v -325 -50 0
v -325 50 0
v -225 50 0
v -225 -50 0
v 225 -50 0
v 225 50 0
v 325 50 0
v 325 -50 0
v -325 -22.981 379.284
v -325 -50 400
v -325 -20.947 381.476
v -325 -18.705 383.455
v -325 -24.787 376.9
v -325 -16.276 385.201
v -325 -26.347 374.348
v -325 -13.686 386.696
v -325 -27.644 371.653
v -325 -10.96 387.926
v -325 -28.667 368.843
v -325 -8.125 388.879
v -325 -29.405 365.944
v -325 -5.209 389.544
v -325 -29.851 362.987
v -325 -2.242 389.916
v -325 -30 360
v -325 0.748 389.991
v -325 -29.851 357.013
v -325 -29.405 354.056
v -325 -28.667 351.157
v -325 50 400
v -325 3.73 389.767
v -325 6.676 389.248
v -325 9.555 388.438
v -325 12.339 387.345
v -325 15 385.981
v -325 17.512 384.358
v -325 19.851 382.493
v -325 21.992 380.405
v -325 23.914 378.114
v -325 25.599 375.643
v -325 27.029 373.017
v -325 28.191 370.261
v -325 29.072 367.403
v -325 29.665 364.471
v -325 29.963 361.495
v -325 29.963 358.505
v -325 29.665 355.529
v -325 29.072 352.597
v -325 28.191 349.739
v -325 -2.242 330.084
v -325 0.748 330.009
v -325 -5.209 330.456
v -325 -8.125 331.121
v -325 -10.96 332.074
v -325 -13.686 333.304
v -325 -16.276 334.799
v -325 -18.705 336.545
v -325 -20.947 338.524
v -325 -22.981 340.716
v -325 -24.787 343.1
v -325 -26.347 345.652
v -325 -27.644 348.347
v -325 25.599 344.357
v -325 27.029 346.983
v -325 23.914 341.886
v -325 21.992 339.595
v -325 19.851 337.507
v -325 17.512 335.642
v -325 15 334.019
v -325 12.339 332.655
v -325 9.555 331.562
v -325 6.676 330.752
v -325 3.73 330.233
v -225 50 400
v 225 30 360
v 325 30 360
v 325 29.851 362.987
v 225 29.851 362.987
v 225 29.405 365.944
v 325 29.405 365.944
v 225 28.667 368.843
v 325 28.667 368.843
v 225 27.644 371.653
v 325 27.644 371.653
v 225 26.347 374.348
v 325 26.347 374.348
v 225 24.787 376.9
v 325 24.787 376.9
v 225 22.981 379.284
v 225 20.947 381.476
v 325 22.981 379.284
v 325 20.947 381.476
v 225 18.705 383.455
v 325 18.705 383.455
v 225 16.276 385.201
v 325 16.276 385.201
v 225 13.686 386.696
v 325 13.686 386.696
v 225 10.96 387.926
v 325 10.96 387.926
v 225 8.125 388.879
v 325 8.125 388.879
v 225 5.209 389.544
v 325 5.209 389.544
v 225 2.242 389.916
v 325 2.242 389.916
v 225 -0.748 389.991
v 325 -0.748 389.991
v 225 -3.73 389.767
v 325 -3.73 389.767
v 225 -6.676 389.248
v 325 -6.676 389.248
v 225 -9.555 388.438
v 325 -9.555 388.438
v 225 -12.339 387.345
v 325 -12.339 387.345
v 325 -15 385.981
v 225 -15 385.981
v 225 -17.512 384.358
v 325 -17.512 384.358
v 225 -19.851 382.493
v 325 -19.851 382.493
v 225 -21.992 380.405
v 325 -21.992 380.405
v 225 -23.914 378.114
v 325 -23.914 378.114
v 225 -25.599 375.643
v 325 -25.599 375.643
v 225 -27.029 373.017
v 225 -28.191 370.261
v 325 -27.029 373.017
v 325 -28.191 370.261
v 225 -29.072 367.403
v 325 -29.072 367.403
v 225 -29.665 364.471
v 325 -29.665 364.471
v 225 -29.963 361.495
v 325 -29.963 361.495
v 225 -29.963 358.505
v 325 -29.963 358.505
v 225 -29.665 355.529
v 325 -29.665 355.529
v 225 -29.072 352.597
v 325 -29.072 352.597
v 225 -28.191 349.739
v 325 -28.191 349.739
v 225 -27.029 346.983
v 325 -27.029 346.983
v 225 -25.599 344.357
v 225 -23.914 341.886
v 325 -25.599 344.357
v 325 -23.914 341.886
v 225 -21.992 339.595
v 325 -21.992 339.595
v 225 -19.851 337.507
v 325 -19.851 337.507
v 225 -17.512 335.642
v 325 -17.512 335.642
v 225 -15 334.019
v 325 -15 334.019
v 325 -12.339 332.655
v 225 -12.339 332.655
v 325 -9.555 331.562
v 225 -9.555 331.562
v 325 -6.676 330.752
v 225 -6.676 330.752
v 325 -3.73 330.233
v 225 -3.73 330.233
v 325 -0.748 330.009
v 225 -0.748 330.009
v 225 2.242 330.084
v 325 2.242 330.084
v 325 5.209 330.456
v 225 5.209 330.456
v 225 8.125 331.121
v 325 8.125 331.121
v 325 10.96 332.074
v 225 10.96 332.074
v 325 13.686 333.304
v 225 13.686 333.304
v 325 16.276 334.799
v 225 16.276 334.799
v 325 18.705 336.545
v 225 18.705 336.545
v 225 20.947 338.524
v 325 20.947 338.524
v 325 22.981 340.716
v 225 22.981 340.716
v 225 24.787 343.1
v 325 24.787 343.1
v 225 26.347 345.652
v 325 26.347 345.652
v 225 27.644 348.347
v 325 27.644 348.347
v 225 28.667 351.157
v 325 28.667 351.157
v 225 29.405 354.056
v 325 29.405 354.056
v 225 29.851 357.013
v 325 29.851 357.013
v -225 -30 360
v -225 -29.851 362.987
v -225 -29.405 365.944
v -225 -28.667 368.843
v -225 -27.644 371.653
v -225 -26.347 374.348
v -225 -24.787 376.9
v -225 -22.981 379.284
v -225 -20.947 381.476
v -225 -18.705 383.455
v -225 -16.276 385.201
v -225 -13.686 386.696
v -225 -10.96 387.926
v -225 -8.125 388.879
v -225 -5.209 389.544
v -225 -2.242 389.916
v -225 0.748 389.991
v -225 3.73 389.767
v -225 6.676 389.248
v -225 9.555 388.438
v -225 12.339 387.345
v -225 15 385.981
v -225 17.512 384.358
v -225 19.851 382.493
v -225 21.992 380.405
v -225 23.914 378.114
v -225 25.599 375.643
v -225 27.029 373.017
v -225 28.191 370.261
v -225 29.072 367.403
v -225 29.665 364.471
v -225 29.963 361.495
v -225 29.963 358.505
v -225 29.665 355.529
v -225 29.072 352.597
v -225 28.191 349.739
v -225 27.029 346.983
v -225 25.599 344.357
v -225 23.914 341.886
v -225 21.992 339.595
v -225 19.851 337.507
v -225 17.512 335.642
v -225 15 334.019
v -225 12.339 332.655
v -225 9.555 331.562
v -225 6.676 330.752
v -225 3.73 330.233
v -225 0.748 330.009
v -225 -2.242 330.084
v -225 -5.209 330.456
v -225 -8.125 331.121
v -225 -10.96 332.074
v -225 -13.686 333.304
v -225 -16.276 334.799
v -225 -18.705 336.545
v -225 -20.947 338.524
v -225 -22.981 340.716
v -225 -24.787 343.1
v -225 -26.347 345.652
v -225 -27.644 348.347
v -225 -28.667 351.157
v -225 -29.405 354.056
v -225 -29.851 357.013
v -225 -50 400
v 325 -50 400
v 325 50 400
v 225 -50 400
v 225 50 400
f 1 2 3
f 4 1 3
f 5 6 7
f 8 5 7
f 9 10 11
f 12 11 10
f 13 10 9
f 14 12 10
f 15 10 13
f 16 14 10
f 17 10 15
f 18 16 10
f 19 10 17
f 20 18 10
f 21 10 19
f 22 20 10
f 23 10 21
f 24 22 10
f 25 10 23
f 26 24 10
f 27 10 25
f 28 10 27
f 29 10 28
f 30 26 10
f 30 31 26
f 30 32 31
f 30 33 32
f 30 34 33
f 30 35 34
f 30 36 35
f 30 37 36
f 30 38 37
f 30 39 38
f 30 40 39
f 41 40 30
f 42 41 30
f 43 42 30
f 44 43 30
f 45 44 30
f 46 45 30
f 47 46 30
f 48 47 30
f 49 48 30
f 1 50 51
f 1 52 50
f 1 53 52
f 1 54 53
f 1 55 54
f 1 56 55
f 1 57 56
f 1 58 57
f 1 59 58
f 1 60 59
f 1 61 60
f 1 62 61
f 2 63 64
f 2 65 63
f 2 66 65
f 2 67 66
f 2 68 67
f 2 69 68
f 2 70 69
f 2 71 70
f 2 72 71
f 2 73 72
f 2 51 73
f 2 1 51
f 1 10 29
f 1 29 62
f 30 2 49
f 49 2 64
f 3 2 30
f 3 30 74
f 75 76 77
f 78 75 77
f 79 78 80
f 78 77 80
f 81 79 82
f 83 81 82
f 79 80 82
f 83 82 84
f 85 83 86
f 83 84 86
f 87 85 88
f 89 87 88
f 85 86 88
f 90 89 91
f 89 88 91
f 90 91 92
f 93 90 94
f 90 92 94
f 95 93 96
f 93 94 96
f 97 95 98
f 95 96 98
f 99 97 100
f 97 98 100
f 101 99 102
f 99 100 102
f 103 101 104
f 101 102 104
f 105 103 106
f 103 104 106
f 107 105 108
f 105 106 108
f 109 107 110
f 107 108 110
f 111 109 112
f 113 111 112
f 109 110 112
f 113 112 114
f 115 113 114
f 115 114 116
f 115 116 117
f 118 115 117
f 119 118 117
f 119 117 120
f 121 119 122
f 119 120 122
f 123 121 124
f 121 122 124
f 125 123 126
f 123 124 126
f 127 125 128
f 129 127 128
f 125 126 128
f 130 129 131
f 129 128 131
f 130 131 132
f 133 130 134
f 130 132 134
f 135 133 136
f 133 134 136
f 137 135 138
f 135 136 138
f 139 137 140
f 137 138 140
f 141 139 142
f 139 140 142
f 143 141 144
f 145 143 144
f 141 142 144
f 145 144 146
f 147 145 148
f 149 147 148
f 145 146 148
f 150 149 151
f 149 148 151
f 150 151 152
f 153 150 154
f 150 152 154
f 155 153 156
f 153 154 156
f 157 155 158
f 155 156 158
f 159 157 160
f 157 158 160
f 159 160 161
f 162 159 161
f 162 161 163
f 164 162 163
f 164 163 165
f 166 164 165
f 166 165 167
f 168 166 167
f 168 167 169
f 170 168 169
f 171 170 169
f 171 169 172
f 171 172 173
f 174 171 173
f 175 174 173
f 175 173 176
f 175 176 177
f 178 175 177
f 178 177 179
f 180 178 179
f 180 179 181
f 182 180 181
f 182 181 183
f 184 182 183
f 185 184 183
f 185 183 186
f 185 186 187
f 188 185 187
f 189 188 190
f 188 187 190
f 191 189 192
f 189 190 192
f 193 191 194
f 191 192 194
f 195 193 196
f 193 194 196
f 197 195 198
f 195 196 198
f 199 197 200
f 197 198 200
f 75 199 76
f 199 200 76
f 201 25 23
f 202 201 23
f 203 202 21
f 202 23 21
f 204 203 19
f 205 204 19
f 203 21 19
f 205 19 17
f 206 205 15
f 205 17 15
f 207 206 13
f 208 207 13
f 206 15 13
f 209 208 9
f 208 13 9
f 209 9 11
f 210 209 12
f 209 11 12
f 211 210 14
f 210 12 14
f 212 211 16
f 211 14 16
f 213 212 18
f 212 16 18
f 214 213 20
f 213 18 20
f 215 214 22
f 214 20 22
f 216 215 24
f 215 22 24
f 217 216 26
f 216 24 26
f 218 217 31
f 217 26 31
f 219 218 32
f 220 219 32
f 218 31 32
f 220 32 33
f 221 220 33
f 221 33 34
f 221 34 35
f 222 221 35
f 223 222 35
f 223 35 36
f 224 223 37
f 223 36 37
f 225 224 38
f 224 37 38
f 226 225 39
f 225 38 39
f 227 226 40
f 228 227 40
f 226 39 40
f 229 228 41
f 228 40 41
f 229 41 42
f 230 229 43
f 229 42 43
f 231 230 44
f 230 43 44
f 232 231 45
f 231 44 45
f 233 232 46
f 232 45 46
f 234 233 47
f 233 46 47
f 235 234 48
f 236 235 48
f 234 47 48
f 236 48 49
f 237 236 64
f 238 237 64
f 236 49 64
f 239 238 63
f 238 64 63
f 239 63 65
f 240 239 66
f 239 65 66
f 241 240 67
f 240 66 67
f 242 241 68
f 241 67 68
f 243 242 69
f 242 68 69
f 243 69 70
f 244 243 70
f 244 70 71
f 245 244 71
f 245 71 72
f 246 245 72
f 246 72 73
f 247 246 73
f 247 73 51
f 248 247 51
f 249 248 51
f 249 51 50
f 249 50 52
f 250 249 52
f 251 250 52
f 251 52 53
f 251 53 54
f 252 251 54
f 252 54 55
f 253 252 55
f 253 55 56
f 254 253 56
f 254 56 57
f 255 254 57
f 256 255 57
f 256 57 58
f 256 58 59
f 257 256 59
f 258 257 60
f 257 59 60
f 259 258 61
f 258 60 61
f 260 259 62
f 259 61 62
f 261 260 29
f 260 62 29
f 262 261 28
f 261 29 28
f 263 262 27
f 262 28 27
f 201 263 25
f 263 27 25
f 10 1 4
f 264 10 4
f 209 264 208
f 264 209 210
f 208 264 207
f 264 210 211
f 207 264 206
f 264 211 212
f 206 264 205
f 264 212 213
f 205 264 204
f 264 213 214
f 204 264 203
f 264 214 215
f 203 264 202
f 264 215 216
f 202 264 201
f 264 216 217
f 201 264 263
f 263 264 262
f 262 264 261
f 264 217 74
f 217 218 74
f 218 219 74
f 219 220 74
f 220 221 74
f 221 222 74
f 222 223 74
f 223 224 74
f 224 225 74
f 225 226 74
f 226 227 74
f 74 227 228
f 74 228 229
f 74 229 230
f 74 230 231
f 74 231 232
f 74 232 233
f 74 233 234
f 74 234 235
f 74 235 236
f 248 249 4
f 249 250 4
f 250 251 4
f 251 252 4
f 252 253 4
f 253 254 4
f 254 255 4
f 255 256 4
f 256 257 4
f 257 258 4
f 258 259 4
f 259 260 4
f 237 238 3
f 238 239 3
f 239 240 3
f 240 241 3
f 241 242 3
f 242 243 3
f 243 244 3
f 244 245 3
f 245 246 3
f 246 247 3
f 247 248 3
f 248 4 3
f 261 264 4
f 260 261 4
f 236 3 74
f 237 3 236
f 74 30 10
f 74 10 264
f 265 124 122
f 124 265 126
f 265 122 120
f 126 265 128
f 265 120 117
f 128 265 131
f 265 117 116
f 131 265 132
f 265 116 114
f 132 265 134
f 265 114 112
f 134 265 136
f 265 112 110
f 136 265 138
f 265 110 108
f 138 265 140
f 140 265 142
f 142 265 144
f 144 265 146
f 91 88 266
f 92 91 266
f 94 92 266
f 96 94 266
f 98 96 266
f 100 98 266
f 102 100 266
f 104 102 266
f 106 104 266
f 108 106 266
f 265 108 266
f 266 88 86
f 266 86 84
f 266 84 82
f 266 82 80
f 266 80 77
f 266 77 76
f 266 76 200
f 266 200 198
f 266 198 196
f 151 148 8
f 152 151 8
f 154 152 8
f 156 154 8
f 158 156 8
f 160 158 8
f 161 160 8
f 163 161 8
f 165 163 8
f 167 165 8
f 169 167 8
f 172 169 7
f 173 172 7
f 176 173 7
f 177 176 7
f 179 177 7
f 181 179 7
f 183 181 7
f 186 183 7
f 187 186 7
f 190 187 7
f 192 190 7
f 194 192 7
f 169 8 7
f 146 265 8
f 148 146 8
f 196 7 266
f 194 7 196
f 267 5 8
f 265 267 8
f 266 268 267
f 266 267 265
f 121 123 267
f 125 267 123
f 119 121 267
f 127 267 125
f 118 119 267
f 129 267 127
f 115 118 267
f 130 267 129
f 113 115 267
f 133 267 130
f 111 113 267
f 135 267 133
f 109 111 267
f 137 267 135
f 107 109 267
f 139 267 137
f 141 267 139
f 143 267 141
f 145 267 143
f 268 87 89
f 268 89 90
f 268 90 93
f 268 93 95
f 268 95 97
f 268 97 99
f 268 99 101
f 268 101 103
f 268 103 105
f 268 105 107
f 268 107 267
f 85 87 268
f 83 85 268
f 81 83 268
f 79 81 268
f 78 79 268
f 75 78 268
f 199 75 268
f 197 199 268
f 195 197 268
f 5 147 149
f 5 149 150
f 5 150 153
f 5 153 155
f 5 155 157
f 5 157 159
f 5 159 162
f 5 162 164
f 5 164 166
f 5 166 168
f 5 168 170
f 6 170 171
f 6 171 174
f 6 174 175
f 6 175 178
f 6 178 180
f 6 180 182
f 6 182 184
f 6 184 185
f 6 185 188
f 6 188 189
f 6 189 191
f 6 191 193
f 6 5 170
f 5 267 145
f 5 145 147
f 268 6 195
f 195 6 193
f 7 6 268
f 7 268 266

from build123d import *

# Parameters (mm, degrees)
F0_W     = 100
F0_H     = 100
F1_DEPTH = 400
F2_R     = 30
F3_DEPTH = 100
F4_R     = 30
F5_DEPTH = 100


with BuildPart() as f1:
    # F0 (on Top) → F1 (new body)
    with BuildSketch(Plane.XY):
        with Locations((-275, 0)):
            Rectangle(F0_W, F0_H)
        with Locations((275, 0)):
            Rectangle(F0_W, F0_H)
    extrude(amount=F1_DEPTH)

    # F2 (on face) → F3 (cut)
    with BuildSketch(Plane.YZ.offset(325)):
        with Locations((0, 360)):
            Circle(F2_R)
    extrude(amount=-F3_DEPTH, mode=Mode.SUBTRACT)

    # F4 (on face) → F5 (cut)
    with BuildSketch(Plane(origin=(-325, 0, 0), x_dir=(0, -1, 0), z_dir=(-1, 0, 0))):
        with Locations((0, 360)):
            Circle(F4_R)
    extrude(amount=-F5_DEPTH, mode=Mode.SUBTRACT)


solid = f1.part
